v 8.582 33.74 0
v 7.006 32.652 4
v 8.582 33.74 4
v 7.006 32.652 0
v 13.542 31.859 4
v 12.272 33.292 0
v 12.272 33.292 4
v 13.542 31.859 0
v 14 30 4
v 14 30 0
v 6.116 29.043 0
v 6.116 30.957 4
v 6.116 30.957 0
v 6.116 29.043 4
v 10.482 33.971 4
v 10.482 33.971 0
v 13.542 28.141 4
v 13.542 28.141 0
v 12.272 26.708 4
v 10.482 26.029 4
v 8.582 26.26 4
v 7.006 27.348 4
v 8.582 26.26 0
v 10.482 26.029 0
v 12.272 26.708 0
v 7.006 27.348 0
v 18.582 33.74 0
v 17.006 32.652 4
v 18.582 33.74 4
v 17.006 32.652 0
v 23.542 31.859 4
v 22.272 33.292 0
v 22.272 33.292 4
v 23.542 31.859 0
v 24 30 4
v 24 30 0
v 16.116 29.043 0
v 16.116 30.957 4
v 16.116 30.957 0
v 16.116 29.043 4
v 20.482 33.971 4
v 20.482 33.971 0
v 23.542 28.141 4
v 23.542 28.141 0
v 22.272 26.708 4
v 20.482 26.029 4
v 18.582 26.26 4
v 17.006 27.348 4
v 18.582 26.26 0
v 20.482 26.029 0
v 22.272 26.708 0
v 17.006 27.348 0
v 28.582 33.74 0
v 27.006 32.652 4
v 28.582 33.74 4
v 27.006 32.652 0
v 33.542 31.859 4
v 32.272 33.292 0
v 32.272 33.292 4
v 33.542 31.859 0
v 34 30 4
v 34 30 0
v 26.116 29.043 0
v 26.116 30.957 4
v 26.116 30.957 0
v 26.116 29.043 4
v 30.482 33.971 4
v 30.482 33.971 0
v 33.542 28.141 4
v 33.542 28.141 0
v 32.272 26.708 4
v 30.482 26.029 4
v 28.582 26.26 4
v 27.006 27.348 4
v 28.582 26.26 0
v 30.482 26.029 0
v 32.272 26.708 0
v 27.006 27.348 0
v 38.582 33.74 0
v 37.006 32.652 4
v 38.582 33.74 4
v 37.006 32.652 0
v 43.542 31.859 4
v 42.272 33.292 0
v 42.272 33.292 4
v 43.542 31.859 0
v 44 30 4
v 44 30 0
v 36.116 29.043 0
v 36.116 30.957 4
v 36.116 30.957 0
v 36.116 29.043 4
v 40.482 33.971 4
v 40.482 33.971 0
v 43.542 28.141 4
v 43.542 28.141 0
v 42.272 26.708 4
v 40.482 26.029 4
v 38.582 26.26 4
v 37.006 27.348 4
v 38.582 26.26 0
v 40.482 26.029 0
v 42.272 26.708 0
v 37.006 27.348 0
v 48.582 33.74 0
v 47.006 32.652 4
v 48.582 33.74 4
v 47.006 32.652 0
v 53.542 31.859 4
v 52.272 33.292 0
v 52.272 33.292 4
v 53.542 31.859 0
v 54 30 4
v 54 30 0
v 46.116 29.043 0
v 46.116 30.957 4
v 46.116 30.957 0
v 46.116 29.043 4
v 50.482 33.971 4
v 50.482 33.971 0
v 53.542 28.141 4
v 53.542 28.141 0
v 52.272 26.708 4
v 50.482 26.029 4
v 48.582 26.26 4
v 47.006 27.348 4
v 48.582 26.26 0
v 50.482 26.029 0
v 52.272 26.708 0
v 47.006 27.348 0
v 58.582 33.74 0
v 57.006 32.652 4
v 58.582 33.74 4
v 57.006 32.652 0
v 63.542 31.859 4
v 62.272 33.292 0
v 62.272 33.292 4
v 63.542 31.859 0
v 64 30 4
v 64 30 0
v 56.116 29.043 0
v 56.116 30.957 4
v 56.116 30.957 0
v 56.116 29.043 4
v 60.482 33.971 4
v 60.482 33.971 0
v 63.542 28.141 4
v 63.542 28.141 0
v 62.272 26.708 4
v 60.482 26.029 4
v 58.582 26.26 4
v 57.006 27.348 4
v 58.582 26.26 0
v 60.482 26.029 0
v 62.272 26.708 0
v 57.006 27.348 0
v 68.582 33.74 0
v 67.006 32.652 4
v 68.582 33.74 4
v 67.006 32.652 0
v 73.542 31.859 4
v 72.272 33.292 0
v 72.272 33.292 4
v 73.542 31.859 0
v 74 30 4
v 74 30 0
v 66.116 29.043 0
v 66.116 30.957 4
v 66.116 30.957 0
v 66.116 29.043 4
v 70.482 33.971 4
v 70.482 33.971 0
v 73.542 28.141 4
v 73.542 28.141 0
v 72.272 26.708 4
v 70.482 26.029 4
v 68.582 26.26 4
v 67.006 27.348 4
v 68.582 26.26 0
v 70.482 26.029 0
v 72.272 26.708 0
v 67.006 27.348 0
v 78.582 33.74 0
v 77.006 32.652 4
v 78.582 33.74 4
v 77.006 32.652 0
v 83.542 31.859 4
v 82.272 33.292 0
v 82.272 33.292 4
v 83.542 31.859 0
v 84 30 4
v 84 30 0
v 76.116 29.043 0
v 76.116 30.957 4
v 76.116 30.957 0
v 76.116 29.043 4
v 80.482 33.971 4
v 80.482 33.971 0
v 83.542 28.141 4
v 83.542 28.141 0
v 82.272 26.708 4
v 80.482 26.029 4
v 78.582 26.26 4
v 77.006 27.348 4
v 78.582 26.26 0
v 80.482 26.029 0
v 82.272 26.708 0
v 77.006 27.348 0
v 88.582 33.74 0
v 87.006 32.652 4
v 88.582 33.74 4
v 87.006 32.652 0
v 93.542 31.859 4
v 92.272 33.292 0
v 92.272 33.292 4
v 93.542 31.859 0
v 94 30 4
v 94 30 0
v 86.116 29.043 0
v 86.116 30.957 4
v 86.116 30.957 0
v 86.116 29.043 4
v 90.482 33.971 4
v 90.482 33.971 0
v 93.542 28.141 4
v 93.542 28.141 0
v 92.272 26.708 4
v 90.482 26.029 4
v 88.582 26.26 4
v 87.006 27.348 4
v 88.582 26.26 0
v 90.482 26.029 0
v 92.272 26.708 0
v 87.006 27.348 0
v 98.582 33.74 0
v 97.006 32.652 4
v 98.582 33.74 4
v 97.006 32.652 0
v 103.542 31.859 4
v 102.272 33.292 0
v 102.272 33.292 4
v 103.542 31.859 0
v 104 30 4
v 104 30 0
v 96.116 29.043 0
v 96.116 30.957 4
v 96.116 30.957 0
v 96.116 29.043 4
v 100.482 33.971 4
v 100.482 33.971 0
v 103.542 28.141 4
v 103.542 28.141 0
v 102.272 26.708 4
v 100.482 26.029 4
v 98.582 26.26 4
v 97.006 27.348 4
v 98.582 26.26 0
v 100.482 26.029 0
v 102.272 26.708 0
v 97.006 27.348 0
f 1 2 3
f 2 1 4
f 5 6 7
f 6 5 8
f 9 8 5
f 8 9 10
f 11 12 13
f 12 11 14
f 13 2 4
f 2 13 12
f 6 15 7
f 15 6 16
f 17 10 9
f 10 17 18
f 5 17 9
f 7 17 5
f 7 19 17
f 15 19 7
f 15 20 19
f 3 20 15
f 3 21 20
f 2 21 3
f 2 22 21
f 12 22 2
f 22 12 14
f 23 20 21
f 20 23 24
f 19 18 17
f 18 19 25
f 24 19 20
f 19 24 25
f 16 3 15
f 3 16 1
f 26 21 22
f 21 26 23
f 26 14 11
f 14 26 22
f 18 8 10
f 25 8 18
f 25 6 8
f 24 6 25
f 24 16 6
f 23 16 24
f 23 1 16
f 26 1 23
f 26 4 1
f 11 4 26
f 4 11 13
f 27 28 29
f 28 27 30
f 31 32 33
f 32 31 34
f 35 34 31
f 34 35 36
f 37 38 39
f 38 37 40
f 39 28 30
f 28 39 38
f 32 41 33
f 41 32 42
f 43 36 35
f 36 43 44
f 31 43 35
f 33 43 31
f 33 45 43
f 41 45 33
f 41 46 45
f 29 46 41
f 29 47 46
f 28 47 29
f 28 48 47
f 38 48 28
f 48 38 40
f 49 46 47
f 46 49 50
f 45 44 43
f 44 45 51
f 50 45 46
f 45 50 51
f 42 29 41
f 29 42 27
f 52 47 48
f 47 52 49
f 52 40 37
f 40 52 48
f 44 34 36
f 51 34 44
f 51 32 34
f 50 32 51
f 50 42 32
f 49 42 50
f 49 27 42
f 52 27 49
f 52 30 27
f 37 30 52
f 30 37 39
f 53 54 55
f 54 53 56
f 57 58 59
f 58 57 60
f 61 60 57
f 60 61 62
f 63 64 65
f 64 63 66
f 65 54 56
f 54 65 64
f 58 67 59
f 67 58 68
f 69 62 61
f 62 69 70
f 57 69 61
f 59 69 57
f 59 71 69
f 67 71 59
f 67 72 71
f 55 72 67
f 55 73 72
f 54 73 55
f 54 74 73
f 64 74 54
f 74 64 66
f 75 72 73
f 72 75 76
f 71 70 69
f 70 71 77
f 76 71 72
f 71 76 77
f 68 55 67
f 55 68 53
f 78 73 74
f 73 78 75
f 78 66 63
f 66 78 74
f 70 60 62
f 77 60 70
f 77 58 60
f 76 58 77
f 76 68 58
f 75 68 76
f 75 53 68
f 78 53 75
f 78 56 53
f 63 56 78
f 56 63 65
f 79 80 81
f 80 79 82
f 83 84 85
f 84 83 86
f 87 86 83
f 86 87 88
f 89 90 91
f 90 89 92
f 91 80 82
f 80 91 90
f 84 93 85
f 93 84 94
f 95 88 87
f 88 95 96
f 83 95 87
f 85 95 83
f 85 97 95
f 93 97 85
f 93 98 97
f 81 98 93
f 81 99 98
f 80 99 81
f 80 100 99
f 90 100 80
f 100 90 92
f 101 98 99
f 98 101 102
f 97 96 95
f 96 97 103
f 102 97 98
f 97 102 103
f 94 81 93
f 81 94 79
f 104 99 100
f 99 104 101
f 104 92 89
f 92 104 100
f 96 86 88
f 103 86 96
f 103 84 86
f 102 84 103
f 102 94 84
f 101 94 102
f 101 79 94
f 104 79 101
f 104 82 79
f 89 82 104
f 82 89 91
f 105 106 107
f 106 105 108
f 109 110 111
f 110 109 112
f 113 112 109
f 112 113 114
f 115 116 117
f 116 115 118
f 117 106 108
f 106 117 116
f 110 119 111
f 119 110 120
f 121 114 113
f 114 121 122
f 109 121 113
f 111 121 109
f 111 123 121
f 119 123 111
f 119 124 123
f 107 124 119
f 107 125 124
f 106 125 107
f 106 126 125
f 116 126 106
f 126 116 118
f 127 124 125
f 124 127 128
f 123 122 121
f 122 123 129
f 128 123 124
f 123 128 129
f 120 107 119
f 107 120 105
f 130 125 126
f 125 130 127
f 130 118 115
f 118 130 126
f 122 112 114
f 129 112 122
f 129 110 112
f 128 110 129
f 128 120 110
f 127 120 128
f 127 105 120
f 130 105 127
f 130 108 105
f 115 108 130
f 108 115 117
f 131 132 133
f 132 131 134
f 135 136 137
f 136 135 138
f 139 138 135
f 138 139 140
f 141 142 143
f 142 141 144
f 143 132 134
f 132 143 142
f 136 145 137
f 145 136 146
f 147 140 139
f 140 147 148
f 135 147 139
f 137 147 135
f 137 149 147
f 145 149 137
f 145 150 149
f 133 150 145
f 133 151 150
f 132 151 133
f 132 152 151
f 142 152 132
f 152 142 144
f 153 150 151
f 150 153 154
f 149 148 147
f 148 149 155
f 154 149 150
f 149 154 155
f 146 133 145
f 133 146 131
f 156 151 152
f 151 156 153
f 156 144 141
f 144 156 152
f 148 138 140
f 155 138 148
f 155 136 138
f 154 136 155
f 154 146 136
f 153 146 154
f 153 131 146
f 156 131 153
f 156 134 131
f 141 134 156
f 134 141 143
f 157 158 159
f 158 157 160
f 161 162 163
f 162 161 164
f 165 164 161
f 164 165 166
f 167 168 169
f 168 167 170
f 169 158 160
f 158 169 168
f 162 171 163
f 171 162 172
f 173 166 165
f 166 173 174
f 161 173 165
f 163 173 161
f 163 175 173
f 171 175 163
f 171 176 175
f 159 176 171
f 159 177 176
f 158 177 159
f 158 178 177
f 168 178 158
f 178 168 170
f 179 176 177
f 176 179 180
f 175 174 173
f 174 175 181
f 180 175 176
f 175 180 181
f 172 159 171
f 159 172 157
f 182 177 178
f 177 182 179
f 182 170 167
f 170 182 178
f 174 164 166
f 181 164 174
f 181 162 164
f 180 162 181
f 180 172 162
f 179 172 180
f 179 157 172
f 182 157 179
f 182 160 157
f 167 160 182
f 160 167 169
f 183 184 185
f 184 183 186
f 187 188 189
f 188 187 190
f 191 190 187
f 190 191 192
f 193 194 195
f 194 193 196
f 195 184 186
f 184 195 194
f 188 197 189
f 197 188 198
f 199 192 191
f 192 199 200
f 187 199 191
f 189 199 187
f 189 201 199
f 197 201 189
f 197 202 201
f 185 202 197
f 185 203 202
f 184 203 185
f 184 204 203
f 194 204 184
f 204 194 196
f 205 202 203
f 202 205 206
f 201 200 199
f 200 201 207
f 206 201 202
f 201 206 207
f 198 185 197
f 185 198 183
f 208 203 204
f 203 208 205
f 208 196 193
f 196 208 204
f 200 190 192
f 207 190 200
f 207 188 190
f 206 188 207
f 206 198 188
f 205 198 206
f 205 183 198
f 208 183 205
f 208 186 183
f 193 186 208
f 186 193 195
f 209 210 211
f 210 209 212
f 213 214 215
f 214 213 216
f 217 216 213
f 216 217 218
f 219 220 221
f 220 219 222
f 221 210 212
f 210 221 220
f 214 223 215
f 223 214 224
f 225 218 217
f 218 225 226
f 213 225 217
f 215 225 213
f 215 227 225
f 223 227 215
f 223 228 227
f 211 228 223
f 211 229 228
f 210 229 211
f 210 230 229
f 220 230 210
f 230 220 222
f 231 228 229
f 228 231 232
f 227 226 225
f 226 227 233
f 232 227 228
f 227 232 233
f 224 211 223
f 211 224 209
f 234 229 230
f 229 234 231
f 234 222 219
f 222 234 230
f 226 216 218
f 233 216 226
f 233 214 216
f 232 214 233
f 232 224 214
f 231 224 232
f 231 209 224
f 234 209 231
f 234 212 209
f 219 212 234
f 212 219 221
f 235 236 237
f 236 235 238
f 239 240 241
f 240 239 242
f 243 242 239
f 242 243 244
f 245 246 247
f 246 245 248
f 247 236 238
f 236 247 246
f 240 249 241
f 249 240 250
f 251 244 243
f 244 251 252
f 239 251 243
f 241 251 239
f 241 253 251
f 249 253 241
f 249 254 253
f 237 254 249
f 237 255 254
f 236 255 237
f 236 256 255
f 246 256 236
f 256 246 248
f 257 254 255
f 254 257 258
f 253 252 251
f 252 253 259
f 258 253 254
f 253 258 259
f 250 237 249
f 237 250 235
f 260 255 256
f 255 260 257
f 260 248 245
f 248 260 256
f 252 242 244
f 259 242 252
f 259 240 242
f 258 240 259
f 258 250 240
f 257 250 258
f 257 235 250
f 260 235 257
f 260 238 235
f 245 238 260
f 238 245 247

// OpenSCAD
for (x_position=[10:10:100]) {
  translate([x_position, 30, 0]) {
    cylinder(h=4, r1=4, r2=4);
  }
  echo(str("x:", x_position)); // a good way to check your mental math
}
